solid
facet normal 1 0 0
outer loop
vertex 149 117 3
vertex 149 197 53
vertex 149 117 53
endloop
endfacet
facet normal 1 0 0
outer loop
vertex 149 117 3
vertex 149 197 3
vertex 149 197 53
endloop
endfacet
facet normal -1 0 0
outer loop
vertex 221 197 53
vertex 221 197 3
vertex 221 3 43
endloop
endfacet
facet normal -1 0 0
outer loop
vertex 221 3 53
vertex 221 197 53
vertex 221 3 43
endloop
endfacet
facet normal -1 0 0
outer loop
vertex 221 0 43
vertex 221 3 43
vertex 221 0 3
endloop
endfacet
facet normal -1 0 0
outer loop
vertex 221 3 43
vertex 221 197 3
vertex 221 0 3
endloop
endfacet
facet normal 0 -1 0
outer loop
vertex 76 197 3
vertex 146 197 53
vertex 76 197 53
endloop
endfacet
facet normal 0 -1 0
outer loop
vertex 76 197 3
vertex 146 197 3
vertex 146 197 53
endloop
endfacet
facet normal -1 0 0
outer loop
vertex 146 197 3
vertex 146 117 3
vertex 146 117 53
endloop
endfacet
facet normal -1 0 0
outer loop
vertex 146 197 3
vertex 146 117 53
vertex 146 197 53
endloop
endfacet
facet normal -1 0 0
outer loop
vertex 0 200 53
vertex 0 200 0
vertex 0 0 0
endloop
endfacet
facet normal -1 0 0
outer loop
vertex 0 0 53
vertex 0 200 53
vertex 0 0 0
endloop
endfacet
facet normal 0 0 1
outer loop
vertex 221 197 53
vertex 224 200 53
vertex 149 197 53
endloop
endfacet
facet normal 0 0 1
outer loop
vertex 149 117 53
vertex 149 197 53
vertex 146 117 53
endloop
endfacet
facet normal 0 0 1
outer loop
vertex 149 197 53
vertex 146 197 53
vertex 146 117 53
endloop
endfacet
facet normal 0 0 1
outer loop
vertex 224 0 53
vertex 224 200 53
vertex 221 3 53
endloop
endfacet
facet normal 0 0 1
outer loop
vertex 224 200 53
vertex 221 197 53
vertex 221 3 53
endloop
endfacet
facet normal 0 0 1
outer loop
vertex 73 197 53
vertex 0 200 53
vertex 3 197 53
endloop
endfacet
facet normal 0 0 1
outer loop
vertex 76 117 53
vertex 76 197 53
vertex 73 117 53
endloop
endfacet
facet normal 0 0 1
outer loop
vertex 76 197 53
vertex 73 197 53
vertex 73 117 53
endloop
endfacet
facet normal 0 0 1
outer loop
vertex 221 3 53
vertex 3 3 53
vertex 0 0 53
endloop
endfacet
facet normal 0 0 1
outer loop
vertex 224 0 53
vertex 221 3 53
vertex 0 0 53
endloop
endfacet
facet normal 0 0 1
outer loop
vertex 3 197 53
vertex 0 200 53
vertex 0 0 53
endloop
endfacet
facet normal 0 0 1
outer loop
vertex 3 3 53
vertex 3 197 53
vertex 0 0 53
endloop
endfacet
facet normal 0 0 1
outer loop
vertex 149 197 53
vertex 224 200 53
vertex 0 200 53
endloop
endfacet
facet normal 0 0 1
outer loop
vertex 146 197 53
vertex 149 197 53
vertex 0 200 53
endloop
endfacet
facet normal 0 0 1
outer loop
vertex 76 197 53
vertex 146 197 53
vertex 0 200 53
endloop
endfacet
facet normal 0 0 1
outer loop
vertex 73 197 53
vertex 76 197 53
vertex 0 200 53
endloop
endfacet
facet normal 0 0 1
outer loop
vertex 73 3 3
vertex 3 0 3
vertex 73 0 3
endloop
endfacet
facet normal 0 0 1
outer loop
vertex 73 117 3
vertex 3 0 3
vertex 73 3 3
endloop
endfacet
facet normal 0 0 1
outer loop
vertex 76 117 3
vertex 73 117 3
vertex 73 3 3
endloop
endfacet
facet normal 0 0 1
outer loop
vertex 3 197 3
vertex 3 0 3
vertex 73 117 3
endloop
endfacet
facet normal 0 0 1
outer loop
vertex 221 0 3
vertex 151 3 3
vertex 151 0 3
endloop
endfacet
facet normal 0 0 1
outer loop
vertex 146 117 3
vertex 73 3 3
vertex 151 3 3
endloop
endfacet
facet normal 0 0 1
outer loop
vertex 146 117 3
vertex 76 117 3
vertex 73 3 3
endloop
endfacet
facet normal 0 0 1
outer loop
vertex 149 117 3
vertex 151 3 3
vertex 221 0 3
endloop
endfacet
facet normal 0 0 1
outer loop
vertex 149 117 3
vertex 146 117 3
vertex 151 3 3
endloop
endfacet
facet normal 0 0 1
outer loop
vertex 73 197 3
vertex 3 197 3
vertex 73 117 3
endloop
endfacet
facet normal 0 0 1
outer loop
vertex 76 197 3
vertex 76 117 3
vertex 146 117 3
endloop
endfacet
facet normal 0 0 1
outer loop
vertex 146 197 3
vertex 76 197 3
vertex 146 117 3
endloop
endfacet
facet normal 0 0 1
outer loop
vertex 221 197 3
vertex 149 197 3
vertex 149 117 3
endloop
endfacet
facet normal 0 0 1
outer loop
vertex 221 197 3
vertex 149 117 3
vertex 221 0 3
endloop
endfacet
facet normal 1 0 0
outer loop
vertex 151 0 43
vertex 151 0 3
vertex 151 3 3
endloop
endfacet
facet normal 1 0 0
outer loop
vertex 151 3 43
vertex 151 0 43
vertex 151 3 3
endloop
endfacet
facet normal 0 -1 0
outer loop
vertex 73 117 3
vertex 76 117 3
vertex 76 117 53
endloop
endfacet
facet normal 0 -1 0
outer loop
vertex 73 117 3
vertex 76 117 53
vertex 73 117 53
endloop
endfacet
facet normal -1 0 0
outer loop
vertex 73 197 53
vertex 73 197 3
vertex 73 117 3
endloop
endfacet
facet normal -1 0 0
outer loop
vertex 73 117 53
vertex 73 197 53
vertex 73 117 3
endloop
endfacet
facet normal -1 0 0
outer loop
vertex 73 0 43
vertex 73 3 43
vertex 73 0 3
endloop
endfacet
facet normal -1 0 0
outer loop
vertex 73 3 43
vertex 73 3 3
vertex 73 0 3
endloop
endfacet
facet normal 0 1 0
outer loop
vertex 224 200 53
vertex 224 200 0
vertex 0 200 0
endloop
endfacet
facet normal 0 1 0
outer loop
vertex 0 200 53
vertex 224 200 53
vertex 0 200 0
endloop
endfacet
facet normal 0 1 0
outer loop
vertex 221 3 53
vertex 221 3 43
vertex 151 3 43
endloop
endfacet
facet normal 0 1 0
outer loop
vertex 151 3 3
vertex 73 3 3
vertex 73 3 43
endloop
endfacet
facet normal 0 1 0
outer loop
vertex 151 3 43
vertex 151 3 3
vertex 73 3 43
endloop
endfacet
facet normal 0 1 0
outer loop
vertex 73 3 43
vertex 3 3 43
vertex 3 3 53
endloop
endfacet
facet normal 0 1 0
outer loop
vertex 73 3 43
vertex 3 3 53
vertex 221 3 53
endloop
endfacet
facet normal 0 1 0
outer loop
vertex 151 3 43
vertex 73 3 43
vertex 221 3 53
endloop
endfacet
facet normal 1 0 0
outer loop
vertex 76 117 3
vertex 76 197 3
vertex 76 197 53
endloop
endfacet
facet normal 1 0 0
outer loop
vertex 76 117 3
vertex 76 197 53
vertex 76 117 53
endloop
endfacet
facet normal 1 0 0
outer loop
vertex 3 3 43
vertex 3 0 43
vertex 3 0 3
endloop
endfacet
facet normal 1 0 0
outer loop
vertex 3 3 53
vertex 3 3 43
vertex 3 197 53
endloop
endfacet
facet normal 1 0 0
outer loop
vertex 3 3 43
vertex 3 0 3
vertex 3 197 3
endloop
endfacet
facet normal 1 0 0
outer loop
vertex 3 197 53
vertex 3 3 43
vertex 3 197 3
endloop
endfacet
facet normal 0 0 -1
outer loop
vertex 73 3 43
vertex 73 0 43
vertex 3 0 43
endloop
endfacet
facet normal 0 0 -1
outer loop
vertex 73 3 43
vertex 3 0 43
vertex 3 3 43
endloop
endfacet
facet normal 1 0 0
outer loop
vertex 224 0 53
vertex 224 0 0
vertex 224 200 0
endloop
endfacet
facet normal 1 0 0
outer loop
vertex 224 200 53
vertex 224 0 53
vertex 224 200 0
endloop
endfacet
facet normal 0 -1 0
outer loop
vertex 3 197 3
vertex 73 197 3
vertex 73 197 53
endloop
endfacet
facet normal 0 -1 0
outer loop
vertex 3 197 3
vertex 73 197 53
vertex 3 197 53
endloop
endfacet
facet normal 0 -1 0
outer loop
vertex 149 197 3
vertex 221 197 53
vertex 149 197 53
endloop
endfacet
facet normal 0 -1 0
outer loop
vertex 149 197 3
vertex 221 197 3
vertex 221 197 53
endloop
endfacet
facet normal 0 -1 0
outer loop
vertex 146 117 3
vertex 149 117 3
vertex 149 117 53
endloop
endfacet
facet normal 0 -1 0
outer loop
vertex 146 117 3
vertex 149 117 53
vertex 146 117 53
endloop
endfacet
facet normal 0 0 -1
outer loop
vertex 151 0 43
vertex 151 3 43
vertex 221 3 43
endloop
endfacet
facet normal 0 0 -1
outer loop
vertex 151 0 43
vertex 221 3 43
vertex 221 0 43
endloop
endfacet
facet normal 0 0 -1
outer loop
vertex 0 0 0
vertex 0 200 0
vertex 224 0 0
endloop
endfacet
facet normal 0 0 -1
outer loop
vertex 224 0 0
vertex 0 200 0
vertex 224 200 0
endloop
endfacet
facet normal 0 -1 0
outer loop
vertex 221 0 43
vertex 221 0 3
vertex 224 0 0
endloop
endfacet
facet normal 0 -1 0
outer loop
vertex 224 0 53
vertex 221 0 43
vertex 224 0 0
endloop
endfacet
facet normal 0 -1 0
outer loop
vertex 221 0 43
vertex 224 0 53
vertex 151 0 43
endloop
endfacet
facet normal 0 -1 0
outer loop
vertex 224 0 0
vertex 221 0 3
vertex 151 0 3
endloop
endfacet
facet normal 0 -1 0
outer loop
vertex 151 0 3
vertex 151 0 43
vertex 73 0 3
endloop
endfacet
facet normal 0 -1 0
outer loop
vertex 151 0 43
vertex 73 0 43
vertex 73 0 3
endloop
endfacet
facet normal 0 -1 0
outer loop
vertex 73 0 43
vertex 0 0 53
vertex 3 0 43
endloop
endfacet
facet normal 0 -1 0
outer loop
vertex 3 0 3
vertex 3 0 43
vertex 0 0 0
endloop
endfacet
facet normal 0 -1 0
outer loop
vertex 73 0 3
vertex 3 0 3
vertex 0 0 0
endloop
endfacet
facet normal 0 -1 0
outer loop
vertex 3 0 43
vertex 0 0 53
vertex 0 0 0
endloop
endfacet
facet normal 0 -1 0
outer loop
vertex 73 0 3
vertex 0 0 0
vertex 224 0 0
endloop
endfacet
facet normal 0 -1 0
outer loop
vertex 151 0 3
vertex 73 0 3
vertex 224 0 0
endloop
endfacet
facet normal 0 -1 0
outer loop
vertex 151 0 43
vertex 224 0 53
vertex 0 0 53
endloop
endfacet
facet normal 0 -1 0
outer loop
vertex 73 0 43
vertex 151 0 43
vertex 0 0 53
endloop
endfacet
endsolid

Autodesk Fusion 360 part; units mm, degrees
sketch "Bottom " plane through (0, 0, 0) normal (0, 0, 1) x (1, 0, 0)
  line L0 (0, 0) -> (224, 0)
  line L1 (224, 0) -> (224, 200)
  line L2 (224, 200) -> (0, 200)
  line L3 (0, 200) -> (0, 0)
  dimension "d1" = 224
  dimension "d2" = 200
extrude "Extrude1" add sketch "Bottom " along normal blind 3
sketch "Left_Border" plane through (0, 0, 3) normal (0, 0, 1) x (-1, 0, 0)
  line L0 (0, -200) -> (0, 0)
  line L1 (0, 0) -> (-224, 0)
  line L2 (-224, 0) -> (-224, -200)
  line L3 (-224, -200) -> (0, -200)
  line L4 (0, 0) -> (-3, 0)
  line L5 (-3, 0) -> (-3, -200)
  line L6 (-3, -200) -> (0, -200)
  line L7 (0, -200) -> (0, 0)
  dimension "d5" = 3
  dimension "d6" = 200
sketch "Back_Border" plane through (0, 0, 3) normal (0, 0, 1) x (-1, 0, 0)
  line L0 (-3, -200) -> (-221, -200)
  line L1 (-221, -200) -> (-221, -197)
  line L2 (-221, -197) -> (-3, -197)
  line L3 (-3, -197) -> (-3, -200)
  dimension "d7" = 218
sketch "Right_Border" plane through (0, 0, 3) normal (0, 0, 1) x (-1, 0, 0)
  line L0 (-224, -200) -> (-221, -200)
  line L1 (-221, -200) -> (-221, 0)
  line L2 (-221, 0) -> (-224, 0)
  line L3 (-224, 0) -> (-224, -200)
  dimension "d8" = 3
  dimension "d9" = 200
extrude "Extrude2" add sketch "Left_Border" along normal blind 50 contours L0 L1 L3 L4 L5 L6 L7
extrude "Extrude3" add sketch "Back_Border" along normal blind 50
extrude "Extrude4" add sketch "Right_Border" along normal blind 50
sketch "limi_1" plane through (0, 0, 3) normal (0, 0, 1) x (-1, 0, 0)
  line L0 (-221, -197) -> (-3, -197)
  line L1 (-3, -197) -> (-3, 0)
  line L2 (-3, 0) -> (-221, 0)
  line L3 (-73, -197) -> (-73, -117)
  line L4 (-73, -197) -> (-76, -197)
  line L5 (-76, -197) -> (-76, -117)
  line L6 (-76, -117) -> (-73, -117)
  line L7 (-221, 0) -> (-221, -197)
  dimension "d17" = 80
  dimension "d18" = 3
  dimension "d19" = 80
extrude "Extrude5" add sketch "limi_1" along normal blind 50 contours L0 L3 L4 L5 L6
sketch "limi_2" plane through (0, 0, 3) normal (0, 0, 1) x (-1, 0, 0)
  line L0 (-73, -117) -> (-73, -197)
  line L1 (-73, -197) -> (-3, -197)
  line L2 (-3, -197) -> (-3, 0)
  line L3 (-3, 0) -> (-221, 0)
  line L4 (-76, -197) -> (-76, -117)
  line L5 (-76, -117) -> (-73, -117)
  line L6 (-146, -197) -> (-149, -197)
  line L7 (-149, -197) -> (-149, -117)
  line L8 (-149, -117) -> (-146, -117)
  line L9 (-146, -117) -> (-146, -197)
  line L10 (-221, 0) -> (-221, -197)
  line L11 (-221, -197) -> (-76, -197)
  dimension "d22" = 70
  dimension "d24" = 3
  dimension "d25" = 80
extrude "Extrude6" add sketch "limi_2" along normal blind 50 contours L6 L7 L8 L9 L11
sketch "Large_Front_Side" plane through (0, 0, 3) normal (0, 0, 1) x (-1, 0, 0)
  line L0 (-149, -197) -> (-149, -117)
  line L1 (-149, -117) -> (-146, -117)
  line L2 (-146, -117) -> (-146, -197)
  line L3 (-146, -197) -> (-76, -197)
  line L4 (-76, -197) -> (-76, -117)
  line L5 (-76, -117) -> (-73, -117)
  line L6 (-73, -117) -> (-73, -197)
  line L7 (-73, -197) -> (-3, -197)
  line L8 (-3, -197) -> (-3, 0)
  line L9 (-3, 0) -> (-221, 0)
  line L10 (-221, 0) -> (-221, -197)
  line L11 (-221, -197) -> (-149, -197)
  line L12 (-3, 0) -> (-73, 0)
  line L13 (-221, 0) -> (-151, 0)
  line L14 (-73, 0) -> (-151, 0)
  line L15 (-151, 0) -> (-151, -3)
  line L16 (-151, -3) -> (-73, -3)
  line L17 (-73, -3) -> (-73, 0)
  dimension "d28" = 70
  dimension "d29" = 70
  dimension "d30" = 3
extrude "Extrude7" add sketch "Large_Front_Side" along normal blind 50 contours L9 L14 L15 L16 L17
sketch "Sketch8" plane through (73, 0, 0) normal (-1, 0, 0) x (0, -1, 0)
  line L0 (-3, 3) -> (0, 3)
  line L1 (0, 3) -> (0, 53)
  line L2 (0, 53) -> (-3, 53)
  line L3 (-3, 53) -> (-3, 3)
  line L4 (-3, 53) -> (0, 53)
  line L5 (0, 53) -> (0, 43)
  line L6 (0, 43) -> (-3, 43)
  line L7 (-3, 43) -> (-3, 53)
  dimension "d33" = 3
  dimension "d34" = 10
extrude "Extrude8" add sketch "Sketch8" along normal blind 70 contours L1 L2 L3 L4 L5 L6 L7
sketch "Sketch9" plane through (151, 0, 0) normal (1, 0, 0) x (0, 1, 0)
  line L0 (0, 3) -> (3, 3)
  line L1 (3, 3) -> (3, 53)
  line L2 (3, 53) -> (0, 53)
  line L3 (0, 53) -> (0, 3)
  line L4 (0, 53) -> (3, 53)
  line L5 (3, 53) -> (3, 43)
  line L6 (3, 43) -> (0, 43)
  line L7 (0, 43) -> (0, 53)
  dimension "d37" = 3
  dimension "d38" = 10
extrude "Extrude9" add sketch "Sketch9" along normal blind 70 contours L1 L2 L3 L4 L5 L6 L7
equation "d7 = 221 mm - 3 mm"
